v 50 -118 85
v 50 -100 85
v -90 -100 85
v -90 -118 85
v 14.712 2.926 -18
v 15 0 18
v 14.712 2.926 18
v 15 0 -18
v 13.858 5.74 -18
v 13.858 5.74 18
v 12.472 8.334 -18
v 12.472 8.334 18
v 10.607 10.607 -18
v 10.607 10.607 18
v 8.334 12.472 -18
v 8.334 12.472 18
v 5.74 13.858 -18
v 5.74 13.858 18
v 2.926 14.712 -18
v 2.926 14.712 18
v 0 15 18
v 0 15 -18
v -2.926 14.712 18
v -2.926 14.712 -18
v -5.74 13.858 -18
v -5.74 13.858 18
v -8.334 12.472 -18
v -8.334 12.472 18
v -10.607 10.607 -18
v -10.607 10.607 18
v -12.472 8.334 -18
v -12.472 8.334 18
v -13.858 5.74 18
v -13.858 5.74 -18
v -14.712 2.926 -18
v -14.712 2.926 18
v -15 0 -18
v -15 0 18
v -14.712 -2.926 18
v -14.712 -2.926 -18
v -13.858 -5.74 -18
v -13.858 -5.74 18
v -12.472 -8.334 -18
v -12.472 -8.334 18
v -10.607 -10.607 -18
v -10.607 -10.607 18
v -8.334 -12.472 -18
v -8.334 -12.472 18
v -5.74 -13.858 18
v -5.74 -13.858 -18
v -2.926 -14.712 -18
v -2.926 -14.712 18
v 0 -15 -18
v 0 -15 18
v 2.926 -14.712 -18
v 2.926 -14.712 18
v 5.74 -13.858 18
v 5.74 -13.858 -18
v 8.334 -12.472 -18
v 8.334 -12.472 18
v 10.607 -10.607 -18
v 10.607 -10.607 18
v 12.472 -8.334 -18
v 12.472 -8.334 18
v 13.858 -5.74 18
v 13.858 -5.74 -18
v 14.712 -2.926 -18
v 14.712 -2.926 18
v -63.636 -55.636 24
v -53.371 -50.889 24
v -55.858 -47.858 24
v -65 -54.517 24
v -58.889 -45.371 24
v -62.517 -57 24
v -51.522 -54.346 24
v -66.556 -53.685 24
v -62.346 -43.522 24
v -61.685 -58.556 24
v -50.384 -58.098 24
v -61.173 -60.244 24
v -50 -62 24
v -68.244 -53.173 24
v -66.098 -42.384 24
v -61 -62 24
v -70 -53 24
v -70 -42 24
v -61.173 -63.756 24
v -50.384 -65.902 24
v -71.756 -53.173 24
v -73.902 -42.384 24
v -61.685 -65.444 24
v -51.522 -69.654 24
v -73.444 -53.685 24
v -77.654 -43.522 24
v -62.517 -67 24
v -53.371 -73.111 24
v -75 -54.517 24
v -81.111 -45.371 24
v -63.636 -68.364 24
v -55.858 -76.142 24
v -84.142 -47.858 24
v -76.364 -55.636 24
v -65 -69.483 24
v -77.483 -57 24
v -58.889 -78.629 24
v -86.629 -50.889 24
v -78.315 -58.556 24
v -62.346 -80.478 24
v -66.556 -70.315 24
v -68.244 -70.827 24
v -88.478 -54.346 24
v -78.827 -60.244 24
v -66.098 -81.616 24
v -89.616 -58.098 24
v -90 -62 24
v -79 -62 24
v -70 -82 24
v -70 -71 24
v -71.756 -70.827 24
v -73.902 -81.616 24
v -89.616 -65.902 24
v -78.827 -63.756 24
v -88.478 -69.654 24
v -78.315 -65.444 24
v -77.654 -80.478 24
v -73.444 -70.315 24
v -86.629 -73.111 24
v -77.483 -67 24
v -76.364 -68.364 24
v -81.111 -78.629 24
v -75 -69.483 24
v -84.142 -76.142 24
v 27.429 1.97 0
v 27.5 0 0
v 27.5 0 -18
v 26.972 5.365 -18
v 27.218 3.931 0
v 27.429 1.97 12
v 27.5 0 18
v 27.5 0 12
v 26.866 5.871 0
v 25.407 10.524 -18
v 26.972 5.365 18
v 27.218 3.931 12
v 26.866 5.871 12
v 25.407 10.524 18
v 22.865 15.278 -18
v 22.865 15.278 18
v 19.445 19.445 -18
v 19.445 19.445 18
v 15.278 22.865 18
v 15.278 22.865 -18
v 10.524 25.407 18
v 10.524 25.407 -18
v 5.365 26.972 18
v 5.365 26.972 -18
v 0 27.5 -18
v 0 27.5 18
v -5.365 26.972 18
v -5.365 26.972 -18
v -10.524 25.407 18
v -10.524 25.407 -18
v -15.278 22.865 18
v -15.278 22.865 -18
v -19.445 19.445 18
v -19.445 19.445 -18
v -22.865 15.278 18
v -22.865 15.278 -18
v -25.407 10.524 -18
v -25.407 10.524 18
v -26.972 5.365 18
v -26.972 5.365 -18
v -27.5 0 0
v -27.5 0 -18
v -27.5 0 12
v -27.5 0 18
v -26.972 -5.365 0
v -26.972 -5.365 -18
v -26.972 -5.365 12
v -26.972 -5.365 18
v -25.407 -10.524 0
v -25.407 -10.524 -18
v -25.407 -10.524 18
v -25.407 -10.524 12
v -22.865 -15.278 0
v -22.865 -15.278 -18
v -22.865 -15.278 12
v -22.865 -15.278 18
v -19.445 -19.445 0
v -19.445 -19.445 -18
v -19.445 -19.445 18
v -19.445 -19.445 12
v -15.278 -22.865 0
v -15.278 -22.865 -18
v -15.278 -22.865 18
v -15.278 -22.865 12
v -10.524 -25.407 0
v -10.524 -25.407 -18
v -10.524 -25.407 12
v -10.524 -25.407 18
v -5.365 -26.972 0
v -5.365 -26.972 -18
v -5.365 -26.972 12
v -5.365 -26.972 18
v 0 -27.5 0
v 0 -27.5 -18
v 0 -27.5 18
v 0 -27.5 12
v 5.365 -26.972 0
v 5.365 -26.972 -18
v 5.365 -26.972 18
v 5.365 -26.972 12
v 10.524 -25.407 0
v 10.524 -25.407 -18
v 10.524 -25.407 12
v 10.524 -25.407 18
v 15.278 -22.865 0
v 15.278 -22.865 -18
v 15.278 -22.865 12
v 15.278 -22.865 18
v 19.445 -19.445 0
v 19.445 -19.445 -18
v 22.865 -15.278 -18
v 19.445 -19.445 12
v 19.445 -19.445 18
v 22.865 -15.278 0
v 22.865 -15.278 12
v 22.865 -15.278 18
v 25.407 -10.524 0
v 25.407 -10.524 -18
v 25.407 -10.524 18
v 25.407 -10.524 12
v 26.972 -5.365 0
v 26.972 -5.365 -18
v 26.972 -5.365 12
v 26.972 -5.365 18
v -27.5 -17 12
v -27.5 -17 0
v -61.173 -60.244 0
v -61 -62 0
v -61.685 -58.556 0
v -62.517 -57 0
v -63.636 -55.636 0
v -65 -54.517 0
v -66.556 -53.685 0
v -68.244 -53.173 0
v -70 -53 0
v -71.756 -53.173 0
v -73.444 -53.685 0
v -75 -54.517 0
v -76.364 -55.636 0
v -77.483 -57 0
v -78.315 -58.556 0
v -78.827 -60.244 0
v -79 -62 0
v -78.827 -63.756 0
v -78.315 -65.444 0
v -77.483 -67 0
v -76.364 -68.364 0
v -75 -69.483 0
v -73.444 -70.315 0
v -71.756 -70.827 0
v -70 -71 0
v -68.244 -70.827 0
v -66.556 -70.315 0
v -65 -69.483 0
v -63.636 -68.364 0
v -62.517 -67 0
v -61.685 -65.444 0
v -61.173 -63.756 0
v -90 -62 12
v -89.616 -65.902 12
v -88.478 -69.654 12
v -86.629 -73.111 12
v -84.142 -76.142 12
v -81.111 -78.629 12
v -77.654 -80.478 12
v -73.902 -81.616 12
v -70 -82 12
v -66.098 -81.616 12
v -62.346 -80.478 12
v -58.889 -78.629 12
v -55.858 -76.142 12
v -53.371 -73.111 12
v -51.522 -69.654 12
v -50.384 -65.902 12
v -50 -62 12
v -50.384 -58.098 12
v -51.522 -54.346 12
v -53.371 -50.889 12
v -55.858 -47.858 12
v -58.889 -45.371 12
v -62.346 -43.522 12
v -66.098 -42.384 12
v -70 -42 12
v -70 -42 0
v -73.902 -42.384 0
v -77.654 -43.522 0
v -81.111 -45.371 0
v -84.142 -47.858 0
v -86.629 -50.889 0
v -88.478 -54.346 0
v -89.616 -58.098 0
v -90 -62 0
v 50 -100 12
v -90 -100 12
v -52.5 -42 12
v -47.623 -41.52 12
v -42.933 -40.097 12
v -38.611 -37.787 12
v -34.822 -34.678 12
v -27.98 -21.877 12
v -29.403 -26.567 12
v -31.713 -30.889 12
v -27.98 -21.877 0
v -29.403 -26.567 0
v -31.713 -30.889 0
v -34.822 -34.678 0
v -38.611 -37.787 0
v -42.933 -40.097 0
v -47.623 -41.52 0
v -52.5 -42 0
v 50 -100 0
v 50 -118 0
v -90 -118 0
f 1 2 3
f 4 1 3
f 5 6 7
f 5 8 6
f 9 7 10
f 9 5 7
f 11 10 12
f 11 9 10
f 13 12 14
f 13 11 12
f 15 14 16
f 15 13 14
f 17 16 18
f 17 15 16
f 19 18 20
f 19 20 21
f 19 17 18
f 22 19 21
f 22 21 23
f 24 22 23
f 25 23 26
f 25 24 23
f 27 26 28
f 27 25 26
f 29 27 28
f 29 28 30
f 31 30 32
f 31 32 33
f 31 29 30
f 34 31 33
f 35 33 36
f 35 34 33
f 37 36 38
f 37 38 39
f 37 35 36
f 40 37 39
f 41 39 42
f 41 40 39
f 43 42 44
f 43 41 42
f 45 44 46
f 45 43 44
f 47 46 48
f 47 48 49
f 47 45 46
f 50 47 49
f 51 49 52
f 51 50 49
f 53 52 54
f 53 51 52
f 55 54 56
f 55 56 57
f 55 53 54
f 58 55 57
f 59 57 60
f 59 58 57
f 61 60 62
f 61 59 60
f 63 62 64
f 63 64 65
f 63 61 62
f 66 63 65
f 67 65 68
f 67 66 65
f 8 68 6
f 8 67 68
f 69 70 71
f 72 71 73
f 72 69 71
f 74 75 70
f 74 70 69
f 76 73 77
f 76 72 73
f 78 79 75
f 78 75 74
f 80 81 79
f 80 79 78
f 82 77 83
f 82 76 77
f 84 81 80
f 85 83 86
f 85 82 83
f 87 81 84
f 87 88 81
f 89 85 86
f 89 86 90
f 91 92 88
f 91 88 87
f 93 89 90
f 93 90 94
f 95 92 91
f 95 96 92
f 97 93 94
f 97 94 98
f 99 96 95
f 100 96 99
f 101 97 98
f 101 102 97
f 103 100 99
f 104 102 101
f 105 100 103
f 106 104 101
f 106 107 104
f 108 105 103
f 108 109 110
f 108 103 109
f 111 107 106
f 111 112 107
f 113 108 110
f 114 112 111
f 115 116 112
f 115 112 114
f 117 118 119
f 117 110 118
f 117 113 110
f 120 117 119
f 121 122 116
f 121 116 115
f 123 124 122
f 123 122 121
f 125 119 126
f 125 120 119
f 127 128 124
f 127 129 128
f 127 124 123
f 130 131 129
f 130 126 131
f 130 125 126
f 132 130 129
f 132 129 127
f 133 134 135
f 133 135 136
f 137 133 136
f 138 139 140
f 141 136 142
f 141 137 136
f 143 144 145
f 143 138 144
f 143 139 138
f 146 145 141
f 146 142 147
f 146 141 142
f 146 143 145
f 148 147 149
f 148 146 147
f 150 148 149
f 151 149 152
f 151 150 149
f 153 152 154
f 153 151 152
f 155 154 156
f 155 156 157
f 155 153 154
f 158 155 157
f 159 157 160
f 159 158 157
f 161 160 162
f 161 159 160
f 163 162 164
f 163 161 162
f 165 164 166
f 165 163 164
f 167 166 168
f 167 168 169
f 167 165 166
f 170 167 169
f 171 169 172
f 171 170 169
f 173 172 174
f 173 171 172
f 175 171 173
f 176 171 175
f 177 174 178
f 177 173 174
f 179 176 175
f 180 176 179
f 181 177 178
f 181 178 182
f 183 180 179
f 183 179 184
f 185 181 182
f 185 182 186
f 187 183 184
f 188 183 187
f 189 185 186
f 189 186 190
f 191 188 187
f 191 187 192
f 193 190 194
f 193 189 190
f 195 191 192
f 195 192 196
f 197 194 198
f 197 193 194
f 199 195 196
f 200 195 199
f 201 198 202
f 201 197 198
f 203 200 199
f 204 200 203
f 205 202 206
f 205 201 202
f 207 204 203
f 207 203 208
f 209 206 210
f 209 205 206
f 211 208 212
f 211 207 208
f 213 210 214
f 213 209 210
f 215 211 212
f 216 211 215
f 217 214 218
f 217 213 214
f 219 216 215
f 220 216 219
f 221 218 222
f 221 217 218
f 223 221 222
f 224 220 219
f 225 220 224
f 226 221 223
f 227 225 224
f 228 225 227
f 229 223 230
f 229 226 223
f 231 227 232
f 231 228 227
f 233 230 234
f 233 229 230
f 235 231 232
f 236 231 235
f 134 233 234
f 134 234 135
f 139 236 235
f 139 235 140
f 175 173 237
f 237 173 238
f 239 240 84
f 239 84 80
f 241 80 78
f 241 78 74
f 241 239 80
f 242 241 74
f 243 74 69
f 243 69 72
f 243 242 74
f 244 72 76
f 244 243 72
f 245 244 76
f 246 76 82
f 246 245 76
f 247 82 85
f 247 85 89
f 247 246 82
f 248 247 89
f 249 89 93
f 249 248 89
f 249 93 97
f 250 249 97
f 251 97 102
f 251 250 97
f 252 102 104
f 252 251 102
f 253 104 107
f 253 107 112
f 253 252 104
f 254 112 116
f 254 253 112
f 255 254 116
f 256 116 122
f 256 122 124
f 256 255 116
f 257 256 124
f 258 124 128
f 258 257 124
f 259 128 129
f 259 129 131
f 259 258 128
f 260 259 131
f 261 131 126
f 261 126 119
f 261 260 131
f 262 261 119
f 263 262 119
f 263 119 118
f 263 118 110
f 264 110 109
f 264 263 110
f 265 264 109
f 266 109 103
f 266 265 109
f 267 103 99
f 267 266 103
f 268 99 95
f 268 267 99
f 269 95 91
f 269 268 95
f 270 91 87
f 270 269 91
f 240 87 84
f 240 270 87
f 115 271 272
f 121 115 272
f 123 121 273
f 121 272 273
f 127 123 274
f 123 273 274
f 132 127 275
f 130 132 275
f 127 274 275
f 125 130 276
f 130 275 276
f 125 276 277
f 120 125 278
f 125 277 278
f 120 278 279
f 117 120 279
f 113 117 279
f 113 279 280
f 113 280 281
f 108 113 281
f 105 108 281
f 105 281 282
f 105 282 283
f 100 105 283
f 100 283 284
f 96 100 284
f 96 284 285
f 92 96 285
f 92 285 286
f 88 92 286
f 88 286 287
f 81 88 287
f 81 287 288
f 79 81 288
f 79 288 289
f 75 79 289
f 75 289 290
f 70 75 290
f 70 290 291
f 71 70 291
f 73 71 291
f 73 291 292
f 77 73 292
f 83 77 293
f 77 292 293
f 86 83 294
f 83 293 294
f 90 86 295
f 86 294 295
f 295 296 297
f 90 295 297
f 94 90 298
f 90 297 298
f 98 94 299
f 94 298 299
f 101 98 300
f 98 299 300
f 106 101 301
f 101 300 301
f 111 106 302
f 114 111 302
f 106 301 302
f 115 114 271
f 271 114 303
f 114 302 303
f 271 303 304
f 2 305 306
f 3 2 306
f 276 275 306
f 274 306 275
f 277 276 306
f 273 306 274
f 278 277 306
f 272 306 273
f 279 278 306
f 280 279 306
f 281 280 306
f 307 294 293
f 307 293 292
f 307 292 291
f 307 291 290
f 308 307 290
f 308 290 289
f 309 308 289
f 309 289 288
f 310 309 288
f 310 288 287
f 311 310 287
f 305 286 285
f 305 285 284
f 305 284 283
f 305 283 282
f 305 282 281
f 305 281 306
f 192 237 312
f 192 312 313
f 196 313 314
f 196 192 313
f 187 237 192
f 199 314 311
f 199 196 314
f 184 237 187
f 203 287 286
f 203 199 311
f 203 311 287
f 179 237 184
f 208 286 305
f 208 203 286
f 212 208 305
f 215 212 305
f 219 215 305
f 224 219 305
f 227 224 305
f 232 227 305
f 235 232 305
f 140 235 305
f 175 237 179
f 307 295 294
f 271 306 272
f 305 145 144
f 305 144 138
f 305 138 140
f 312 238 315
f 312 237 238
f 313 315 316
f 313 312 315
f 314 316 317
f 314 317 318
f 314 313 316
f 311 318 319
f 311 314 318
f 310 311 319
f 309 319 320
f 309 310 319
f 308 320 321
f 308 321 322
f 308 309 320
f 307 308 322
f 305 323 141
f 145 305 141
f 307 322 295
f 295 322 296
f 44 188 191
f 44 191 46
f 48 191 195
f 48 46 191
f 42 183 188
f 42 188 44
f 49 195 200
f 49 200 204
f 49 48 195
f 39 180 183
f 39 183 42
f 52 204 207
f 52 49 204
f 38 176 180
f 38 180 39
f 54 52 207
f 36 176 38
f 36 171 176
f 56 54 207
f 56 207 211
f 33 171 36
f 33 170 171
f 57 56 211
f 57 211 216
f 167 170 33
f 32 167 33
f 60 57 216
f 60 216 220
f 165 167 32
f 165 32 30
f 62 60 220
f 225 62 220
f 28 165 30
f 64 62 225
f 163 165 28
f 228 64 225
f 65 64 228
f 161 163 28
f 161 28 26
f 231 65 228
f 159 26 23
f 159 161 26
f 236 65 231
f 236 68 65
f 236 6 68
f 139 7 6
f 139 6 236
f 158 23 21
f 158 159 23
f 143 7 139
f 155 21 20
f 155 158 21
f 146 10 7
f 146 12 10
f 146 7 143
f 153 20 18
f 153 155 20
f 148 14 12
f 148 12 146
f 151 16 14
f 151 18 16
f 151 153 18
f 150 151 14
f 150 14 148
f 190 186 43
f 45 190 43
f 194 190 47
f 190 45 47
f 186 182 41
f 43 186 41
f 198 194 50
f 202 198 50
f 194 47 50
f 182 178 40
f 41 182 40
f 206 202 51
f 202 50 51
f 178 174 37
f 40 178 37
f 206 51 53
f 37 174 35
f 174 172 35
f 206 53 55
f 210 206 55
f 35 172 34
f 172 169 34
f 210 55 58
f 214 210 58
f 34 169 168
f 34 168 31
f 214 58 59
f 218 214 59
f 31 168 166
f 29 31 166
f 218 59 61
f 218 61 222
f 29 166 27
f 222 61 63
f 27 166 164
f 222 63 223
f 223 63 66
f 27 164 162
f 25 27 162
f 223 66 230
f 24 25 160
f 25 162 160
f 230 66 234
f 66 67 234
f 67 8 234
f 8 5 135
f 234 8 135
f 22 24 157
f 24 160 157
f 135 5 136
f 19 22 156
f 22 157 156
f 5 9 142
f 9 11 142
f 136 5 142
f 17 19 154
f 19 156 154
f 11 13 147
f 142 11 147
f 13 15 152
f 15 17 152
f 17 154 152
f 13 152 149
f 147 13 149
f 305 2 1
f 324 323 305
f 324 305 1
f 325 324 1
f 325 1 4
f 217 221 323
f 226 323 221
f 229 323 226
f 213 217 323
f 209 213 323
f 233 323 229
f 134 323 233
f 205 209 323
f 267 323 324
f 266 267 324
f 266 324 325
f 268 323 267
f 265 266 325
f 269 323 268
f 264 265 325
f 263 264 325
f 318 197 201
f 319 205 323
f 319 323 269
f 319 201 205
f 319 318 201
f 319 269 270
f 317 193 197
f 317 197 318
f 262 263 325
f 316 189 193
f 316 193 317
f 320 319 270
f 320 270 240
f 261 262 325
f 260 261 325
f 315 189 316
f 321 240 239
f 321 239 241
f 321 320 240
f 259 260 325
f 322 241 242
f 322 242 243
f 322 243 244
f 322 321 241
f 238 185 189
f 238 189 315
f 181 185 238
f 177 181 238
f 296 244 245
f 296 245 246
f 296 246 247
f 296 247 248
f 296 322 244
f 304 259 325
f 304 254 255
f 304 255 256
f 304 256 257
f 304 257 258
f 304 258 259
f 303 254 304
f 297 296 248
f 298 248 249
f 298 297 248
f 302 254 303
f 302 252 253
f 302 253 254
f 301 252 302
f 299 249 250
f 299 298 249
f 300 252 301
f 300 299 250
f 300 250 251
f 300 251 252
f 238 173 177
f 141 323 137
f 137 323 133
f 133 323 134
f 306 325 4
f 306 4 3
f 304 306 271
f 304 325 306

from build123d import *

# Parameters (mm, degrees)
BOSS_EXTRUDE1_DEPTH = 12
SKETCH2_3_R         = 9
BOSS_EXTRUDE2_DEPTH = 24
SKETCH2_4_R         = 15
BOSS_EXTRUDE3_DEPTH = 18
BOSS_EXTRUDE4_DEPTH = 85
FILLET1_R           = 25


with BuildPart() as part:
    # Sketch2 → Boss-Extrude1 (new body)
    with BuildSketch(Plane.XY):
        with BuildLine():
            Line((-90, -100), (0, -100))
            Line((0, -100), (50, -100))
            Line((50, -100), (26.866088482, 5.870544241))
            ThreePointArc((26.866088482, 5.870544241), (27.341062829, 2.952335241), (27.5, 0))
            ThreePointArc((27.5, 0), (0, -27.5), (-27.5, 0))
            Line((-27.5, 0), (-27.5, -42))
            Line((-27.5, -42), (-70, -42))
            ThreePointArc((-70, -42), (-55.857864376, -47.857864376), (-50, -62))
            ThreePointArc((-50, -62), (-70, -82), (-90, -62))
            Line((-90, -62), (-90, -100))
        make_face()
    extrude(amount=BOSS_EXTRUDE1_DEPTH)

    # Sketch2<3> → Boss-Extrude2 (add)
    with BuildSketch(Plane.XY):
        with BuildLine():
            ThreePointArc((-70, -42), (-84.142135624, -47.857864376), (-90, -62))
            ThreePointArc((-90, -62), (-70, -82), (-50, -62))
            ThreePointArc((-50, -62), (-55.857864376, -47.857864376), (-70, -42))
        make_face()
        with Locations((-70, -62)):
            Circle(SKETCH2_3_R, mode=Mode.SUBTRACT)
    extrude(amount=BOSS_EXTRUDE2_DEPTH)

    # Sketch2<4> → Boss-Extrude3 (add, symmetric)
    with BuildSketch(Plane.XY):
        with BuildLine():
            ThreePointArc((27.5, 0), (27.341062829, 2.952335241), (26.866088482, 5.870544241))
            ThreePointArc((26.866088482, 5.870544241), (-2.952335241, 27.341062829), (-27.5, 0))
            ThreePointArc((-27.5, 0), (0, -27.5), (27.5, 0))
        make_face()
        Circle(SKETCH2_4_R, mode=Mode.SUBTRACT)
    extrude(amount=BOSS_EXTRUDE3_DEPTH, both=True)

    # Sketch2<5> → Boss-Extrude4 (add)
    with BuildSketch(Plane.XY):
        Polygon((50, -100), (0, -100), (-90, -100), (-90, -118), (50, -118), align=None)
    extrude(amount=BOSS_EXTRUDE4_DEPTH)

    # Fillet1
    fillet1_edges = [part.edges().sort_by_distance(p)[0] for p in [
        (-27.5, -42, 6),
    ]]
    fillet(fillet1_edges, radius=FILLET1_R)


solid = part.part
